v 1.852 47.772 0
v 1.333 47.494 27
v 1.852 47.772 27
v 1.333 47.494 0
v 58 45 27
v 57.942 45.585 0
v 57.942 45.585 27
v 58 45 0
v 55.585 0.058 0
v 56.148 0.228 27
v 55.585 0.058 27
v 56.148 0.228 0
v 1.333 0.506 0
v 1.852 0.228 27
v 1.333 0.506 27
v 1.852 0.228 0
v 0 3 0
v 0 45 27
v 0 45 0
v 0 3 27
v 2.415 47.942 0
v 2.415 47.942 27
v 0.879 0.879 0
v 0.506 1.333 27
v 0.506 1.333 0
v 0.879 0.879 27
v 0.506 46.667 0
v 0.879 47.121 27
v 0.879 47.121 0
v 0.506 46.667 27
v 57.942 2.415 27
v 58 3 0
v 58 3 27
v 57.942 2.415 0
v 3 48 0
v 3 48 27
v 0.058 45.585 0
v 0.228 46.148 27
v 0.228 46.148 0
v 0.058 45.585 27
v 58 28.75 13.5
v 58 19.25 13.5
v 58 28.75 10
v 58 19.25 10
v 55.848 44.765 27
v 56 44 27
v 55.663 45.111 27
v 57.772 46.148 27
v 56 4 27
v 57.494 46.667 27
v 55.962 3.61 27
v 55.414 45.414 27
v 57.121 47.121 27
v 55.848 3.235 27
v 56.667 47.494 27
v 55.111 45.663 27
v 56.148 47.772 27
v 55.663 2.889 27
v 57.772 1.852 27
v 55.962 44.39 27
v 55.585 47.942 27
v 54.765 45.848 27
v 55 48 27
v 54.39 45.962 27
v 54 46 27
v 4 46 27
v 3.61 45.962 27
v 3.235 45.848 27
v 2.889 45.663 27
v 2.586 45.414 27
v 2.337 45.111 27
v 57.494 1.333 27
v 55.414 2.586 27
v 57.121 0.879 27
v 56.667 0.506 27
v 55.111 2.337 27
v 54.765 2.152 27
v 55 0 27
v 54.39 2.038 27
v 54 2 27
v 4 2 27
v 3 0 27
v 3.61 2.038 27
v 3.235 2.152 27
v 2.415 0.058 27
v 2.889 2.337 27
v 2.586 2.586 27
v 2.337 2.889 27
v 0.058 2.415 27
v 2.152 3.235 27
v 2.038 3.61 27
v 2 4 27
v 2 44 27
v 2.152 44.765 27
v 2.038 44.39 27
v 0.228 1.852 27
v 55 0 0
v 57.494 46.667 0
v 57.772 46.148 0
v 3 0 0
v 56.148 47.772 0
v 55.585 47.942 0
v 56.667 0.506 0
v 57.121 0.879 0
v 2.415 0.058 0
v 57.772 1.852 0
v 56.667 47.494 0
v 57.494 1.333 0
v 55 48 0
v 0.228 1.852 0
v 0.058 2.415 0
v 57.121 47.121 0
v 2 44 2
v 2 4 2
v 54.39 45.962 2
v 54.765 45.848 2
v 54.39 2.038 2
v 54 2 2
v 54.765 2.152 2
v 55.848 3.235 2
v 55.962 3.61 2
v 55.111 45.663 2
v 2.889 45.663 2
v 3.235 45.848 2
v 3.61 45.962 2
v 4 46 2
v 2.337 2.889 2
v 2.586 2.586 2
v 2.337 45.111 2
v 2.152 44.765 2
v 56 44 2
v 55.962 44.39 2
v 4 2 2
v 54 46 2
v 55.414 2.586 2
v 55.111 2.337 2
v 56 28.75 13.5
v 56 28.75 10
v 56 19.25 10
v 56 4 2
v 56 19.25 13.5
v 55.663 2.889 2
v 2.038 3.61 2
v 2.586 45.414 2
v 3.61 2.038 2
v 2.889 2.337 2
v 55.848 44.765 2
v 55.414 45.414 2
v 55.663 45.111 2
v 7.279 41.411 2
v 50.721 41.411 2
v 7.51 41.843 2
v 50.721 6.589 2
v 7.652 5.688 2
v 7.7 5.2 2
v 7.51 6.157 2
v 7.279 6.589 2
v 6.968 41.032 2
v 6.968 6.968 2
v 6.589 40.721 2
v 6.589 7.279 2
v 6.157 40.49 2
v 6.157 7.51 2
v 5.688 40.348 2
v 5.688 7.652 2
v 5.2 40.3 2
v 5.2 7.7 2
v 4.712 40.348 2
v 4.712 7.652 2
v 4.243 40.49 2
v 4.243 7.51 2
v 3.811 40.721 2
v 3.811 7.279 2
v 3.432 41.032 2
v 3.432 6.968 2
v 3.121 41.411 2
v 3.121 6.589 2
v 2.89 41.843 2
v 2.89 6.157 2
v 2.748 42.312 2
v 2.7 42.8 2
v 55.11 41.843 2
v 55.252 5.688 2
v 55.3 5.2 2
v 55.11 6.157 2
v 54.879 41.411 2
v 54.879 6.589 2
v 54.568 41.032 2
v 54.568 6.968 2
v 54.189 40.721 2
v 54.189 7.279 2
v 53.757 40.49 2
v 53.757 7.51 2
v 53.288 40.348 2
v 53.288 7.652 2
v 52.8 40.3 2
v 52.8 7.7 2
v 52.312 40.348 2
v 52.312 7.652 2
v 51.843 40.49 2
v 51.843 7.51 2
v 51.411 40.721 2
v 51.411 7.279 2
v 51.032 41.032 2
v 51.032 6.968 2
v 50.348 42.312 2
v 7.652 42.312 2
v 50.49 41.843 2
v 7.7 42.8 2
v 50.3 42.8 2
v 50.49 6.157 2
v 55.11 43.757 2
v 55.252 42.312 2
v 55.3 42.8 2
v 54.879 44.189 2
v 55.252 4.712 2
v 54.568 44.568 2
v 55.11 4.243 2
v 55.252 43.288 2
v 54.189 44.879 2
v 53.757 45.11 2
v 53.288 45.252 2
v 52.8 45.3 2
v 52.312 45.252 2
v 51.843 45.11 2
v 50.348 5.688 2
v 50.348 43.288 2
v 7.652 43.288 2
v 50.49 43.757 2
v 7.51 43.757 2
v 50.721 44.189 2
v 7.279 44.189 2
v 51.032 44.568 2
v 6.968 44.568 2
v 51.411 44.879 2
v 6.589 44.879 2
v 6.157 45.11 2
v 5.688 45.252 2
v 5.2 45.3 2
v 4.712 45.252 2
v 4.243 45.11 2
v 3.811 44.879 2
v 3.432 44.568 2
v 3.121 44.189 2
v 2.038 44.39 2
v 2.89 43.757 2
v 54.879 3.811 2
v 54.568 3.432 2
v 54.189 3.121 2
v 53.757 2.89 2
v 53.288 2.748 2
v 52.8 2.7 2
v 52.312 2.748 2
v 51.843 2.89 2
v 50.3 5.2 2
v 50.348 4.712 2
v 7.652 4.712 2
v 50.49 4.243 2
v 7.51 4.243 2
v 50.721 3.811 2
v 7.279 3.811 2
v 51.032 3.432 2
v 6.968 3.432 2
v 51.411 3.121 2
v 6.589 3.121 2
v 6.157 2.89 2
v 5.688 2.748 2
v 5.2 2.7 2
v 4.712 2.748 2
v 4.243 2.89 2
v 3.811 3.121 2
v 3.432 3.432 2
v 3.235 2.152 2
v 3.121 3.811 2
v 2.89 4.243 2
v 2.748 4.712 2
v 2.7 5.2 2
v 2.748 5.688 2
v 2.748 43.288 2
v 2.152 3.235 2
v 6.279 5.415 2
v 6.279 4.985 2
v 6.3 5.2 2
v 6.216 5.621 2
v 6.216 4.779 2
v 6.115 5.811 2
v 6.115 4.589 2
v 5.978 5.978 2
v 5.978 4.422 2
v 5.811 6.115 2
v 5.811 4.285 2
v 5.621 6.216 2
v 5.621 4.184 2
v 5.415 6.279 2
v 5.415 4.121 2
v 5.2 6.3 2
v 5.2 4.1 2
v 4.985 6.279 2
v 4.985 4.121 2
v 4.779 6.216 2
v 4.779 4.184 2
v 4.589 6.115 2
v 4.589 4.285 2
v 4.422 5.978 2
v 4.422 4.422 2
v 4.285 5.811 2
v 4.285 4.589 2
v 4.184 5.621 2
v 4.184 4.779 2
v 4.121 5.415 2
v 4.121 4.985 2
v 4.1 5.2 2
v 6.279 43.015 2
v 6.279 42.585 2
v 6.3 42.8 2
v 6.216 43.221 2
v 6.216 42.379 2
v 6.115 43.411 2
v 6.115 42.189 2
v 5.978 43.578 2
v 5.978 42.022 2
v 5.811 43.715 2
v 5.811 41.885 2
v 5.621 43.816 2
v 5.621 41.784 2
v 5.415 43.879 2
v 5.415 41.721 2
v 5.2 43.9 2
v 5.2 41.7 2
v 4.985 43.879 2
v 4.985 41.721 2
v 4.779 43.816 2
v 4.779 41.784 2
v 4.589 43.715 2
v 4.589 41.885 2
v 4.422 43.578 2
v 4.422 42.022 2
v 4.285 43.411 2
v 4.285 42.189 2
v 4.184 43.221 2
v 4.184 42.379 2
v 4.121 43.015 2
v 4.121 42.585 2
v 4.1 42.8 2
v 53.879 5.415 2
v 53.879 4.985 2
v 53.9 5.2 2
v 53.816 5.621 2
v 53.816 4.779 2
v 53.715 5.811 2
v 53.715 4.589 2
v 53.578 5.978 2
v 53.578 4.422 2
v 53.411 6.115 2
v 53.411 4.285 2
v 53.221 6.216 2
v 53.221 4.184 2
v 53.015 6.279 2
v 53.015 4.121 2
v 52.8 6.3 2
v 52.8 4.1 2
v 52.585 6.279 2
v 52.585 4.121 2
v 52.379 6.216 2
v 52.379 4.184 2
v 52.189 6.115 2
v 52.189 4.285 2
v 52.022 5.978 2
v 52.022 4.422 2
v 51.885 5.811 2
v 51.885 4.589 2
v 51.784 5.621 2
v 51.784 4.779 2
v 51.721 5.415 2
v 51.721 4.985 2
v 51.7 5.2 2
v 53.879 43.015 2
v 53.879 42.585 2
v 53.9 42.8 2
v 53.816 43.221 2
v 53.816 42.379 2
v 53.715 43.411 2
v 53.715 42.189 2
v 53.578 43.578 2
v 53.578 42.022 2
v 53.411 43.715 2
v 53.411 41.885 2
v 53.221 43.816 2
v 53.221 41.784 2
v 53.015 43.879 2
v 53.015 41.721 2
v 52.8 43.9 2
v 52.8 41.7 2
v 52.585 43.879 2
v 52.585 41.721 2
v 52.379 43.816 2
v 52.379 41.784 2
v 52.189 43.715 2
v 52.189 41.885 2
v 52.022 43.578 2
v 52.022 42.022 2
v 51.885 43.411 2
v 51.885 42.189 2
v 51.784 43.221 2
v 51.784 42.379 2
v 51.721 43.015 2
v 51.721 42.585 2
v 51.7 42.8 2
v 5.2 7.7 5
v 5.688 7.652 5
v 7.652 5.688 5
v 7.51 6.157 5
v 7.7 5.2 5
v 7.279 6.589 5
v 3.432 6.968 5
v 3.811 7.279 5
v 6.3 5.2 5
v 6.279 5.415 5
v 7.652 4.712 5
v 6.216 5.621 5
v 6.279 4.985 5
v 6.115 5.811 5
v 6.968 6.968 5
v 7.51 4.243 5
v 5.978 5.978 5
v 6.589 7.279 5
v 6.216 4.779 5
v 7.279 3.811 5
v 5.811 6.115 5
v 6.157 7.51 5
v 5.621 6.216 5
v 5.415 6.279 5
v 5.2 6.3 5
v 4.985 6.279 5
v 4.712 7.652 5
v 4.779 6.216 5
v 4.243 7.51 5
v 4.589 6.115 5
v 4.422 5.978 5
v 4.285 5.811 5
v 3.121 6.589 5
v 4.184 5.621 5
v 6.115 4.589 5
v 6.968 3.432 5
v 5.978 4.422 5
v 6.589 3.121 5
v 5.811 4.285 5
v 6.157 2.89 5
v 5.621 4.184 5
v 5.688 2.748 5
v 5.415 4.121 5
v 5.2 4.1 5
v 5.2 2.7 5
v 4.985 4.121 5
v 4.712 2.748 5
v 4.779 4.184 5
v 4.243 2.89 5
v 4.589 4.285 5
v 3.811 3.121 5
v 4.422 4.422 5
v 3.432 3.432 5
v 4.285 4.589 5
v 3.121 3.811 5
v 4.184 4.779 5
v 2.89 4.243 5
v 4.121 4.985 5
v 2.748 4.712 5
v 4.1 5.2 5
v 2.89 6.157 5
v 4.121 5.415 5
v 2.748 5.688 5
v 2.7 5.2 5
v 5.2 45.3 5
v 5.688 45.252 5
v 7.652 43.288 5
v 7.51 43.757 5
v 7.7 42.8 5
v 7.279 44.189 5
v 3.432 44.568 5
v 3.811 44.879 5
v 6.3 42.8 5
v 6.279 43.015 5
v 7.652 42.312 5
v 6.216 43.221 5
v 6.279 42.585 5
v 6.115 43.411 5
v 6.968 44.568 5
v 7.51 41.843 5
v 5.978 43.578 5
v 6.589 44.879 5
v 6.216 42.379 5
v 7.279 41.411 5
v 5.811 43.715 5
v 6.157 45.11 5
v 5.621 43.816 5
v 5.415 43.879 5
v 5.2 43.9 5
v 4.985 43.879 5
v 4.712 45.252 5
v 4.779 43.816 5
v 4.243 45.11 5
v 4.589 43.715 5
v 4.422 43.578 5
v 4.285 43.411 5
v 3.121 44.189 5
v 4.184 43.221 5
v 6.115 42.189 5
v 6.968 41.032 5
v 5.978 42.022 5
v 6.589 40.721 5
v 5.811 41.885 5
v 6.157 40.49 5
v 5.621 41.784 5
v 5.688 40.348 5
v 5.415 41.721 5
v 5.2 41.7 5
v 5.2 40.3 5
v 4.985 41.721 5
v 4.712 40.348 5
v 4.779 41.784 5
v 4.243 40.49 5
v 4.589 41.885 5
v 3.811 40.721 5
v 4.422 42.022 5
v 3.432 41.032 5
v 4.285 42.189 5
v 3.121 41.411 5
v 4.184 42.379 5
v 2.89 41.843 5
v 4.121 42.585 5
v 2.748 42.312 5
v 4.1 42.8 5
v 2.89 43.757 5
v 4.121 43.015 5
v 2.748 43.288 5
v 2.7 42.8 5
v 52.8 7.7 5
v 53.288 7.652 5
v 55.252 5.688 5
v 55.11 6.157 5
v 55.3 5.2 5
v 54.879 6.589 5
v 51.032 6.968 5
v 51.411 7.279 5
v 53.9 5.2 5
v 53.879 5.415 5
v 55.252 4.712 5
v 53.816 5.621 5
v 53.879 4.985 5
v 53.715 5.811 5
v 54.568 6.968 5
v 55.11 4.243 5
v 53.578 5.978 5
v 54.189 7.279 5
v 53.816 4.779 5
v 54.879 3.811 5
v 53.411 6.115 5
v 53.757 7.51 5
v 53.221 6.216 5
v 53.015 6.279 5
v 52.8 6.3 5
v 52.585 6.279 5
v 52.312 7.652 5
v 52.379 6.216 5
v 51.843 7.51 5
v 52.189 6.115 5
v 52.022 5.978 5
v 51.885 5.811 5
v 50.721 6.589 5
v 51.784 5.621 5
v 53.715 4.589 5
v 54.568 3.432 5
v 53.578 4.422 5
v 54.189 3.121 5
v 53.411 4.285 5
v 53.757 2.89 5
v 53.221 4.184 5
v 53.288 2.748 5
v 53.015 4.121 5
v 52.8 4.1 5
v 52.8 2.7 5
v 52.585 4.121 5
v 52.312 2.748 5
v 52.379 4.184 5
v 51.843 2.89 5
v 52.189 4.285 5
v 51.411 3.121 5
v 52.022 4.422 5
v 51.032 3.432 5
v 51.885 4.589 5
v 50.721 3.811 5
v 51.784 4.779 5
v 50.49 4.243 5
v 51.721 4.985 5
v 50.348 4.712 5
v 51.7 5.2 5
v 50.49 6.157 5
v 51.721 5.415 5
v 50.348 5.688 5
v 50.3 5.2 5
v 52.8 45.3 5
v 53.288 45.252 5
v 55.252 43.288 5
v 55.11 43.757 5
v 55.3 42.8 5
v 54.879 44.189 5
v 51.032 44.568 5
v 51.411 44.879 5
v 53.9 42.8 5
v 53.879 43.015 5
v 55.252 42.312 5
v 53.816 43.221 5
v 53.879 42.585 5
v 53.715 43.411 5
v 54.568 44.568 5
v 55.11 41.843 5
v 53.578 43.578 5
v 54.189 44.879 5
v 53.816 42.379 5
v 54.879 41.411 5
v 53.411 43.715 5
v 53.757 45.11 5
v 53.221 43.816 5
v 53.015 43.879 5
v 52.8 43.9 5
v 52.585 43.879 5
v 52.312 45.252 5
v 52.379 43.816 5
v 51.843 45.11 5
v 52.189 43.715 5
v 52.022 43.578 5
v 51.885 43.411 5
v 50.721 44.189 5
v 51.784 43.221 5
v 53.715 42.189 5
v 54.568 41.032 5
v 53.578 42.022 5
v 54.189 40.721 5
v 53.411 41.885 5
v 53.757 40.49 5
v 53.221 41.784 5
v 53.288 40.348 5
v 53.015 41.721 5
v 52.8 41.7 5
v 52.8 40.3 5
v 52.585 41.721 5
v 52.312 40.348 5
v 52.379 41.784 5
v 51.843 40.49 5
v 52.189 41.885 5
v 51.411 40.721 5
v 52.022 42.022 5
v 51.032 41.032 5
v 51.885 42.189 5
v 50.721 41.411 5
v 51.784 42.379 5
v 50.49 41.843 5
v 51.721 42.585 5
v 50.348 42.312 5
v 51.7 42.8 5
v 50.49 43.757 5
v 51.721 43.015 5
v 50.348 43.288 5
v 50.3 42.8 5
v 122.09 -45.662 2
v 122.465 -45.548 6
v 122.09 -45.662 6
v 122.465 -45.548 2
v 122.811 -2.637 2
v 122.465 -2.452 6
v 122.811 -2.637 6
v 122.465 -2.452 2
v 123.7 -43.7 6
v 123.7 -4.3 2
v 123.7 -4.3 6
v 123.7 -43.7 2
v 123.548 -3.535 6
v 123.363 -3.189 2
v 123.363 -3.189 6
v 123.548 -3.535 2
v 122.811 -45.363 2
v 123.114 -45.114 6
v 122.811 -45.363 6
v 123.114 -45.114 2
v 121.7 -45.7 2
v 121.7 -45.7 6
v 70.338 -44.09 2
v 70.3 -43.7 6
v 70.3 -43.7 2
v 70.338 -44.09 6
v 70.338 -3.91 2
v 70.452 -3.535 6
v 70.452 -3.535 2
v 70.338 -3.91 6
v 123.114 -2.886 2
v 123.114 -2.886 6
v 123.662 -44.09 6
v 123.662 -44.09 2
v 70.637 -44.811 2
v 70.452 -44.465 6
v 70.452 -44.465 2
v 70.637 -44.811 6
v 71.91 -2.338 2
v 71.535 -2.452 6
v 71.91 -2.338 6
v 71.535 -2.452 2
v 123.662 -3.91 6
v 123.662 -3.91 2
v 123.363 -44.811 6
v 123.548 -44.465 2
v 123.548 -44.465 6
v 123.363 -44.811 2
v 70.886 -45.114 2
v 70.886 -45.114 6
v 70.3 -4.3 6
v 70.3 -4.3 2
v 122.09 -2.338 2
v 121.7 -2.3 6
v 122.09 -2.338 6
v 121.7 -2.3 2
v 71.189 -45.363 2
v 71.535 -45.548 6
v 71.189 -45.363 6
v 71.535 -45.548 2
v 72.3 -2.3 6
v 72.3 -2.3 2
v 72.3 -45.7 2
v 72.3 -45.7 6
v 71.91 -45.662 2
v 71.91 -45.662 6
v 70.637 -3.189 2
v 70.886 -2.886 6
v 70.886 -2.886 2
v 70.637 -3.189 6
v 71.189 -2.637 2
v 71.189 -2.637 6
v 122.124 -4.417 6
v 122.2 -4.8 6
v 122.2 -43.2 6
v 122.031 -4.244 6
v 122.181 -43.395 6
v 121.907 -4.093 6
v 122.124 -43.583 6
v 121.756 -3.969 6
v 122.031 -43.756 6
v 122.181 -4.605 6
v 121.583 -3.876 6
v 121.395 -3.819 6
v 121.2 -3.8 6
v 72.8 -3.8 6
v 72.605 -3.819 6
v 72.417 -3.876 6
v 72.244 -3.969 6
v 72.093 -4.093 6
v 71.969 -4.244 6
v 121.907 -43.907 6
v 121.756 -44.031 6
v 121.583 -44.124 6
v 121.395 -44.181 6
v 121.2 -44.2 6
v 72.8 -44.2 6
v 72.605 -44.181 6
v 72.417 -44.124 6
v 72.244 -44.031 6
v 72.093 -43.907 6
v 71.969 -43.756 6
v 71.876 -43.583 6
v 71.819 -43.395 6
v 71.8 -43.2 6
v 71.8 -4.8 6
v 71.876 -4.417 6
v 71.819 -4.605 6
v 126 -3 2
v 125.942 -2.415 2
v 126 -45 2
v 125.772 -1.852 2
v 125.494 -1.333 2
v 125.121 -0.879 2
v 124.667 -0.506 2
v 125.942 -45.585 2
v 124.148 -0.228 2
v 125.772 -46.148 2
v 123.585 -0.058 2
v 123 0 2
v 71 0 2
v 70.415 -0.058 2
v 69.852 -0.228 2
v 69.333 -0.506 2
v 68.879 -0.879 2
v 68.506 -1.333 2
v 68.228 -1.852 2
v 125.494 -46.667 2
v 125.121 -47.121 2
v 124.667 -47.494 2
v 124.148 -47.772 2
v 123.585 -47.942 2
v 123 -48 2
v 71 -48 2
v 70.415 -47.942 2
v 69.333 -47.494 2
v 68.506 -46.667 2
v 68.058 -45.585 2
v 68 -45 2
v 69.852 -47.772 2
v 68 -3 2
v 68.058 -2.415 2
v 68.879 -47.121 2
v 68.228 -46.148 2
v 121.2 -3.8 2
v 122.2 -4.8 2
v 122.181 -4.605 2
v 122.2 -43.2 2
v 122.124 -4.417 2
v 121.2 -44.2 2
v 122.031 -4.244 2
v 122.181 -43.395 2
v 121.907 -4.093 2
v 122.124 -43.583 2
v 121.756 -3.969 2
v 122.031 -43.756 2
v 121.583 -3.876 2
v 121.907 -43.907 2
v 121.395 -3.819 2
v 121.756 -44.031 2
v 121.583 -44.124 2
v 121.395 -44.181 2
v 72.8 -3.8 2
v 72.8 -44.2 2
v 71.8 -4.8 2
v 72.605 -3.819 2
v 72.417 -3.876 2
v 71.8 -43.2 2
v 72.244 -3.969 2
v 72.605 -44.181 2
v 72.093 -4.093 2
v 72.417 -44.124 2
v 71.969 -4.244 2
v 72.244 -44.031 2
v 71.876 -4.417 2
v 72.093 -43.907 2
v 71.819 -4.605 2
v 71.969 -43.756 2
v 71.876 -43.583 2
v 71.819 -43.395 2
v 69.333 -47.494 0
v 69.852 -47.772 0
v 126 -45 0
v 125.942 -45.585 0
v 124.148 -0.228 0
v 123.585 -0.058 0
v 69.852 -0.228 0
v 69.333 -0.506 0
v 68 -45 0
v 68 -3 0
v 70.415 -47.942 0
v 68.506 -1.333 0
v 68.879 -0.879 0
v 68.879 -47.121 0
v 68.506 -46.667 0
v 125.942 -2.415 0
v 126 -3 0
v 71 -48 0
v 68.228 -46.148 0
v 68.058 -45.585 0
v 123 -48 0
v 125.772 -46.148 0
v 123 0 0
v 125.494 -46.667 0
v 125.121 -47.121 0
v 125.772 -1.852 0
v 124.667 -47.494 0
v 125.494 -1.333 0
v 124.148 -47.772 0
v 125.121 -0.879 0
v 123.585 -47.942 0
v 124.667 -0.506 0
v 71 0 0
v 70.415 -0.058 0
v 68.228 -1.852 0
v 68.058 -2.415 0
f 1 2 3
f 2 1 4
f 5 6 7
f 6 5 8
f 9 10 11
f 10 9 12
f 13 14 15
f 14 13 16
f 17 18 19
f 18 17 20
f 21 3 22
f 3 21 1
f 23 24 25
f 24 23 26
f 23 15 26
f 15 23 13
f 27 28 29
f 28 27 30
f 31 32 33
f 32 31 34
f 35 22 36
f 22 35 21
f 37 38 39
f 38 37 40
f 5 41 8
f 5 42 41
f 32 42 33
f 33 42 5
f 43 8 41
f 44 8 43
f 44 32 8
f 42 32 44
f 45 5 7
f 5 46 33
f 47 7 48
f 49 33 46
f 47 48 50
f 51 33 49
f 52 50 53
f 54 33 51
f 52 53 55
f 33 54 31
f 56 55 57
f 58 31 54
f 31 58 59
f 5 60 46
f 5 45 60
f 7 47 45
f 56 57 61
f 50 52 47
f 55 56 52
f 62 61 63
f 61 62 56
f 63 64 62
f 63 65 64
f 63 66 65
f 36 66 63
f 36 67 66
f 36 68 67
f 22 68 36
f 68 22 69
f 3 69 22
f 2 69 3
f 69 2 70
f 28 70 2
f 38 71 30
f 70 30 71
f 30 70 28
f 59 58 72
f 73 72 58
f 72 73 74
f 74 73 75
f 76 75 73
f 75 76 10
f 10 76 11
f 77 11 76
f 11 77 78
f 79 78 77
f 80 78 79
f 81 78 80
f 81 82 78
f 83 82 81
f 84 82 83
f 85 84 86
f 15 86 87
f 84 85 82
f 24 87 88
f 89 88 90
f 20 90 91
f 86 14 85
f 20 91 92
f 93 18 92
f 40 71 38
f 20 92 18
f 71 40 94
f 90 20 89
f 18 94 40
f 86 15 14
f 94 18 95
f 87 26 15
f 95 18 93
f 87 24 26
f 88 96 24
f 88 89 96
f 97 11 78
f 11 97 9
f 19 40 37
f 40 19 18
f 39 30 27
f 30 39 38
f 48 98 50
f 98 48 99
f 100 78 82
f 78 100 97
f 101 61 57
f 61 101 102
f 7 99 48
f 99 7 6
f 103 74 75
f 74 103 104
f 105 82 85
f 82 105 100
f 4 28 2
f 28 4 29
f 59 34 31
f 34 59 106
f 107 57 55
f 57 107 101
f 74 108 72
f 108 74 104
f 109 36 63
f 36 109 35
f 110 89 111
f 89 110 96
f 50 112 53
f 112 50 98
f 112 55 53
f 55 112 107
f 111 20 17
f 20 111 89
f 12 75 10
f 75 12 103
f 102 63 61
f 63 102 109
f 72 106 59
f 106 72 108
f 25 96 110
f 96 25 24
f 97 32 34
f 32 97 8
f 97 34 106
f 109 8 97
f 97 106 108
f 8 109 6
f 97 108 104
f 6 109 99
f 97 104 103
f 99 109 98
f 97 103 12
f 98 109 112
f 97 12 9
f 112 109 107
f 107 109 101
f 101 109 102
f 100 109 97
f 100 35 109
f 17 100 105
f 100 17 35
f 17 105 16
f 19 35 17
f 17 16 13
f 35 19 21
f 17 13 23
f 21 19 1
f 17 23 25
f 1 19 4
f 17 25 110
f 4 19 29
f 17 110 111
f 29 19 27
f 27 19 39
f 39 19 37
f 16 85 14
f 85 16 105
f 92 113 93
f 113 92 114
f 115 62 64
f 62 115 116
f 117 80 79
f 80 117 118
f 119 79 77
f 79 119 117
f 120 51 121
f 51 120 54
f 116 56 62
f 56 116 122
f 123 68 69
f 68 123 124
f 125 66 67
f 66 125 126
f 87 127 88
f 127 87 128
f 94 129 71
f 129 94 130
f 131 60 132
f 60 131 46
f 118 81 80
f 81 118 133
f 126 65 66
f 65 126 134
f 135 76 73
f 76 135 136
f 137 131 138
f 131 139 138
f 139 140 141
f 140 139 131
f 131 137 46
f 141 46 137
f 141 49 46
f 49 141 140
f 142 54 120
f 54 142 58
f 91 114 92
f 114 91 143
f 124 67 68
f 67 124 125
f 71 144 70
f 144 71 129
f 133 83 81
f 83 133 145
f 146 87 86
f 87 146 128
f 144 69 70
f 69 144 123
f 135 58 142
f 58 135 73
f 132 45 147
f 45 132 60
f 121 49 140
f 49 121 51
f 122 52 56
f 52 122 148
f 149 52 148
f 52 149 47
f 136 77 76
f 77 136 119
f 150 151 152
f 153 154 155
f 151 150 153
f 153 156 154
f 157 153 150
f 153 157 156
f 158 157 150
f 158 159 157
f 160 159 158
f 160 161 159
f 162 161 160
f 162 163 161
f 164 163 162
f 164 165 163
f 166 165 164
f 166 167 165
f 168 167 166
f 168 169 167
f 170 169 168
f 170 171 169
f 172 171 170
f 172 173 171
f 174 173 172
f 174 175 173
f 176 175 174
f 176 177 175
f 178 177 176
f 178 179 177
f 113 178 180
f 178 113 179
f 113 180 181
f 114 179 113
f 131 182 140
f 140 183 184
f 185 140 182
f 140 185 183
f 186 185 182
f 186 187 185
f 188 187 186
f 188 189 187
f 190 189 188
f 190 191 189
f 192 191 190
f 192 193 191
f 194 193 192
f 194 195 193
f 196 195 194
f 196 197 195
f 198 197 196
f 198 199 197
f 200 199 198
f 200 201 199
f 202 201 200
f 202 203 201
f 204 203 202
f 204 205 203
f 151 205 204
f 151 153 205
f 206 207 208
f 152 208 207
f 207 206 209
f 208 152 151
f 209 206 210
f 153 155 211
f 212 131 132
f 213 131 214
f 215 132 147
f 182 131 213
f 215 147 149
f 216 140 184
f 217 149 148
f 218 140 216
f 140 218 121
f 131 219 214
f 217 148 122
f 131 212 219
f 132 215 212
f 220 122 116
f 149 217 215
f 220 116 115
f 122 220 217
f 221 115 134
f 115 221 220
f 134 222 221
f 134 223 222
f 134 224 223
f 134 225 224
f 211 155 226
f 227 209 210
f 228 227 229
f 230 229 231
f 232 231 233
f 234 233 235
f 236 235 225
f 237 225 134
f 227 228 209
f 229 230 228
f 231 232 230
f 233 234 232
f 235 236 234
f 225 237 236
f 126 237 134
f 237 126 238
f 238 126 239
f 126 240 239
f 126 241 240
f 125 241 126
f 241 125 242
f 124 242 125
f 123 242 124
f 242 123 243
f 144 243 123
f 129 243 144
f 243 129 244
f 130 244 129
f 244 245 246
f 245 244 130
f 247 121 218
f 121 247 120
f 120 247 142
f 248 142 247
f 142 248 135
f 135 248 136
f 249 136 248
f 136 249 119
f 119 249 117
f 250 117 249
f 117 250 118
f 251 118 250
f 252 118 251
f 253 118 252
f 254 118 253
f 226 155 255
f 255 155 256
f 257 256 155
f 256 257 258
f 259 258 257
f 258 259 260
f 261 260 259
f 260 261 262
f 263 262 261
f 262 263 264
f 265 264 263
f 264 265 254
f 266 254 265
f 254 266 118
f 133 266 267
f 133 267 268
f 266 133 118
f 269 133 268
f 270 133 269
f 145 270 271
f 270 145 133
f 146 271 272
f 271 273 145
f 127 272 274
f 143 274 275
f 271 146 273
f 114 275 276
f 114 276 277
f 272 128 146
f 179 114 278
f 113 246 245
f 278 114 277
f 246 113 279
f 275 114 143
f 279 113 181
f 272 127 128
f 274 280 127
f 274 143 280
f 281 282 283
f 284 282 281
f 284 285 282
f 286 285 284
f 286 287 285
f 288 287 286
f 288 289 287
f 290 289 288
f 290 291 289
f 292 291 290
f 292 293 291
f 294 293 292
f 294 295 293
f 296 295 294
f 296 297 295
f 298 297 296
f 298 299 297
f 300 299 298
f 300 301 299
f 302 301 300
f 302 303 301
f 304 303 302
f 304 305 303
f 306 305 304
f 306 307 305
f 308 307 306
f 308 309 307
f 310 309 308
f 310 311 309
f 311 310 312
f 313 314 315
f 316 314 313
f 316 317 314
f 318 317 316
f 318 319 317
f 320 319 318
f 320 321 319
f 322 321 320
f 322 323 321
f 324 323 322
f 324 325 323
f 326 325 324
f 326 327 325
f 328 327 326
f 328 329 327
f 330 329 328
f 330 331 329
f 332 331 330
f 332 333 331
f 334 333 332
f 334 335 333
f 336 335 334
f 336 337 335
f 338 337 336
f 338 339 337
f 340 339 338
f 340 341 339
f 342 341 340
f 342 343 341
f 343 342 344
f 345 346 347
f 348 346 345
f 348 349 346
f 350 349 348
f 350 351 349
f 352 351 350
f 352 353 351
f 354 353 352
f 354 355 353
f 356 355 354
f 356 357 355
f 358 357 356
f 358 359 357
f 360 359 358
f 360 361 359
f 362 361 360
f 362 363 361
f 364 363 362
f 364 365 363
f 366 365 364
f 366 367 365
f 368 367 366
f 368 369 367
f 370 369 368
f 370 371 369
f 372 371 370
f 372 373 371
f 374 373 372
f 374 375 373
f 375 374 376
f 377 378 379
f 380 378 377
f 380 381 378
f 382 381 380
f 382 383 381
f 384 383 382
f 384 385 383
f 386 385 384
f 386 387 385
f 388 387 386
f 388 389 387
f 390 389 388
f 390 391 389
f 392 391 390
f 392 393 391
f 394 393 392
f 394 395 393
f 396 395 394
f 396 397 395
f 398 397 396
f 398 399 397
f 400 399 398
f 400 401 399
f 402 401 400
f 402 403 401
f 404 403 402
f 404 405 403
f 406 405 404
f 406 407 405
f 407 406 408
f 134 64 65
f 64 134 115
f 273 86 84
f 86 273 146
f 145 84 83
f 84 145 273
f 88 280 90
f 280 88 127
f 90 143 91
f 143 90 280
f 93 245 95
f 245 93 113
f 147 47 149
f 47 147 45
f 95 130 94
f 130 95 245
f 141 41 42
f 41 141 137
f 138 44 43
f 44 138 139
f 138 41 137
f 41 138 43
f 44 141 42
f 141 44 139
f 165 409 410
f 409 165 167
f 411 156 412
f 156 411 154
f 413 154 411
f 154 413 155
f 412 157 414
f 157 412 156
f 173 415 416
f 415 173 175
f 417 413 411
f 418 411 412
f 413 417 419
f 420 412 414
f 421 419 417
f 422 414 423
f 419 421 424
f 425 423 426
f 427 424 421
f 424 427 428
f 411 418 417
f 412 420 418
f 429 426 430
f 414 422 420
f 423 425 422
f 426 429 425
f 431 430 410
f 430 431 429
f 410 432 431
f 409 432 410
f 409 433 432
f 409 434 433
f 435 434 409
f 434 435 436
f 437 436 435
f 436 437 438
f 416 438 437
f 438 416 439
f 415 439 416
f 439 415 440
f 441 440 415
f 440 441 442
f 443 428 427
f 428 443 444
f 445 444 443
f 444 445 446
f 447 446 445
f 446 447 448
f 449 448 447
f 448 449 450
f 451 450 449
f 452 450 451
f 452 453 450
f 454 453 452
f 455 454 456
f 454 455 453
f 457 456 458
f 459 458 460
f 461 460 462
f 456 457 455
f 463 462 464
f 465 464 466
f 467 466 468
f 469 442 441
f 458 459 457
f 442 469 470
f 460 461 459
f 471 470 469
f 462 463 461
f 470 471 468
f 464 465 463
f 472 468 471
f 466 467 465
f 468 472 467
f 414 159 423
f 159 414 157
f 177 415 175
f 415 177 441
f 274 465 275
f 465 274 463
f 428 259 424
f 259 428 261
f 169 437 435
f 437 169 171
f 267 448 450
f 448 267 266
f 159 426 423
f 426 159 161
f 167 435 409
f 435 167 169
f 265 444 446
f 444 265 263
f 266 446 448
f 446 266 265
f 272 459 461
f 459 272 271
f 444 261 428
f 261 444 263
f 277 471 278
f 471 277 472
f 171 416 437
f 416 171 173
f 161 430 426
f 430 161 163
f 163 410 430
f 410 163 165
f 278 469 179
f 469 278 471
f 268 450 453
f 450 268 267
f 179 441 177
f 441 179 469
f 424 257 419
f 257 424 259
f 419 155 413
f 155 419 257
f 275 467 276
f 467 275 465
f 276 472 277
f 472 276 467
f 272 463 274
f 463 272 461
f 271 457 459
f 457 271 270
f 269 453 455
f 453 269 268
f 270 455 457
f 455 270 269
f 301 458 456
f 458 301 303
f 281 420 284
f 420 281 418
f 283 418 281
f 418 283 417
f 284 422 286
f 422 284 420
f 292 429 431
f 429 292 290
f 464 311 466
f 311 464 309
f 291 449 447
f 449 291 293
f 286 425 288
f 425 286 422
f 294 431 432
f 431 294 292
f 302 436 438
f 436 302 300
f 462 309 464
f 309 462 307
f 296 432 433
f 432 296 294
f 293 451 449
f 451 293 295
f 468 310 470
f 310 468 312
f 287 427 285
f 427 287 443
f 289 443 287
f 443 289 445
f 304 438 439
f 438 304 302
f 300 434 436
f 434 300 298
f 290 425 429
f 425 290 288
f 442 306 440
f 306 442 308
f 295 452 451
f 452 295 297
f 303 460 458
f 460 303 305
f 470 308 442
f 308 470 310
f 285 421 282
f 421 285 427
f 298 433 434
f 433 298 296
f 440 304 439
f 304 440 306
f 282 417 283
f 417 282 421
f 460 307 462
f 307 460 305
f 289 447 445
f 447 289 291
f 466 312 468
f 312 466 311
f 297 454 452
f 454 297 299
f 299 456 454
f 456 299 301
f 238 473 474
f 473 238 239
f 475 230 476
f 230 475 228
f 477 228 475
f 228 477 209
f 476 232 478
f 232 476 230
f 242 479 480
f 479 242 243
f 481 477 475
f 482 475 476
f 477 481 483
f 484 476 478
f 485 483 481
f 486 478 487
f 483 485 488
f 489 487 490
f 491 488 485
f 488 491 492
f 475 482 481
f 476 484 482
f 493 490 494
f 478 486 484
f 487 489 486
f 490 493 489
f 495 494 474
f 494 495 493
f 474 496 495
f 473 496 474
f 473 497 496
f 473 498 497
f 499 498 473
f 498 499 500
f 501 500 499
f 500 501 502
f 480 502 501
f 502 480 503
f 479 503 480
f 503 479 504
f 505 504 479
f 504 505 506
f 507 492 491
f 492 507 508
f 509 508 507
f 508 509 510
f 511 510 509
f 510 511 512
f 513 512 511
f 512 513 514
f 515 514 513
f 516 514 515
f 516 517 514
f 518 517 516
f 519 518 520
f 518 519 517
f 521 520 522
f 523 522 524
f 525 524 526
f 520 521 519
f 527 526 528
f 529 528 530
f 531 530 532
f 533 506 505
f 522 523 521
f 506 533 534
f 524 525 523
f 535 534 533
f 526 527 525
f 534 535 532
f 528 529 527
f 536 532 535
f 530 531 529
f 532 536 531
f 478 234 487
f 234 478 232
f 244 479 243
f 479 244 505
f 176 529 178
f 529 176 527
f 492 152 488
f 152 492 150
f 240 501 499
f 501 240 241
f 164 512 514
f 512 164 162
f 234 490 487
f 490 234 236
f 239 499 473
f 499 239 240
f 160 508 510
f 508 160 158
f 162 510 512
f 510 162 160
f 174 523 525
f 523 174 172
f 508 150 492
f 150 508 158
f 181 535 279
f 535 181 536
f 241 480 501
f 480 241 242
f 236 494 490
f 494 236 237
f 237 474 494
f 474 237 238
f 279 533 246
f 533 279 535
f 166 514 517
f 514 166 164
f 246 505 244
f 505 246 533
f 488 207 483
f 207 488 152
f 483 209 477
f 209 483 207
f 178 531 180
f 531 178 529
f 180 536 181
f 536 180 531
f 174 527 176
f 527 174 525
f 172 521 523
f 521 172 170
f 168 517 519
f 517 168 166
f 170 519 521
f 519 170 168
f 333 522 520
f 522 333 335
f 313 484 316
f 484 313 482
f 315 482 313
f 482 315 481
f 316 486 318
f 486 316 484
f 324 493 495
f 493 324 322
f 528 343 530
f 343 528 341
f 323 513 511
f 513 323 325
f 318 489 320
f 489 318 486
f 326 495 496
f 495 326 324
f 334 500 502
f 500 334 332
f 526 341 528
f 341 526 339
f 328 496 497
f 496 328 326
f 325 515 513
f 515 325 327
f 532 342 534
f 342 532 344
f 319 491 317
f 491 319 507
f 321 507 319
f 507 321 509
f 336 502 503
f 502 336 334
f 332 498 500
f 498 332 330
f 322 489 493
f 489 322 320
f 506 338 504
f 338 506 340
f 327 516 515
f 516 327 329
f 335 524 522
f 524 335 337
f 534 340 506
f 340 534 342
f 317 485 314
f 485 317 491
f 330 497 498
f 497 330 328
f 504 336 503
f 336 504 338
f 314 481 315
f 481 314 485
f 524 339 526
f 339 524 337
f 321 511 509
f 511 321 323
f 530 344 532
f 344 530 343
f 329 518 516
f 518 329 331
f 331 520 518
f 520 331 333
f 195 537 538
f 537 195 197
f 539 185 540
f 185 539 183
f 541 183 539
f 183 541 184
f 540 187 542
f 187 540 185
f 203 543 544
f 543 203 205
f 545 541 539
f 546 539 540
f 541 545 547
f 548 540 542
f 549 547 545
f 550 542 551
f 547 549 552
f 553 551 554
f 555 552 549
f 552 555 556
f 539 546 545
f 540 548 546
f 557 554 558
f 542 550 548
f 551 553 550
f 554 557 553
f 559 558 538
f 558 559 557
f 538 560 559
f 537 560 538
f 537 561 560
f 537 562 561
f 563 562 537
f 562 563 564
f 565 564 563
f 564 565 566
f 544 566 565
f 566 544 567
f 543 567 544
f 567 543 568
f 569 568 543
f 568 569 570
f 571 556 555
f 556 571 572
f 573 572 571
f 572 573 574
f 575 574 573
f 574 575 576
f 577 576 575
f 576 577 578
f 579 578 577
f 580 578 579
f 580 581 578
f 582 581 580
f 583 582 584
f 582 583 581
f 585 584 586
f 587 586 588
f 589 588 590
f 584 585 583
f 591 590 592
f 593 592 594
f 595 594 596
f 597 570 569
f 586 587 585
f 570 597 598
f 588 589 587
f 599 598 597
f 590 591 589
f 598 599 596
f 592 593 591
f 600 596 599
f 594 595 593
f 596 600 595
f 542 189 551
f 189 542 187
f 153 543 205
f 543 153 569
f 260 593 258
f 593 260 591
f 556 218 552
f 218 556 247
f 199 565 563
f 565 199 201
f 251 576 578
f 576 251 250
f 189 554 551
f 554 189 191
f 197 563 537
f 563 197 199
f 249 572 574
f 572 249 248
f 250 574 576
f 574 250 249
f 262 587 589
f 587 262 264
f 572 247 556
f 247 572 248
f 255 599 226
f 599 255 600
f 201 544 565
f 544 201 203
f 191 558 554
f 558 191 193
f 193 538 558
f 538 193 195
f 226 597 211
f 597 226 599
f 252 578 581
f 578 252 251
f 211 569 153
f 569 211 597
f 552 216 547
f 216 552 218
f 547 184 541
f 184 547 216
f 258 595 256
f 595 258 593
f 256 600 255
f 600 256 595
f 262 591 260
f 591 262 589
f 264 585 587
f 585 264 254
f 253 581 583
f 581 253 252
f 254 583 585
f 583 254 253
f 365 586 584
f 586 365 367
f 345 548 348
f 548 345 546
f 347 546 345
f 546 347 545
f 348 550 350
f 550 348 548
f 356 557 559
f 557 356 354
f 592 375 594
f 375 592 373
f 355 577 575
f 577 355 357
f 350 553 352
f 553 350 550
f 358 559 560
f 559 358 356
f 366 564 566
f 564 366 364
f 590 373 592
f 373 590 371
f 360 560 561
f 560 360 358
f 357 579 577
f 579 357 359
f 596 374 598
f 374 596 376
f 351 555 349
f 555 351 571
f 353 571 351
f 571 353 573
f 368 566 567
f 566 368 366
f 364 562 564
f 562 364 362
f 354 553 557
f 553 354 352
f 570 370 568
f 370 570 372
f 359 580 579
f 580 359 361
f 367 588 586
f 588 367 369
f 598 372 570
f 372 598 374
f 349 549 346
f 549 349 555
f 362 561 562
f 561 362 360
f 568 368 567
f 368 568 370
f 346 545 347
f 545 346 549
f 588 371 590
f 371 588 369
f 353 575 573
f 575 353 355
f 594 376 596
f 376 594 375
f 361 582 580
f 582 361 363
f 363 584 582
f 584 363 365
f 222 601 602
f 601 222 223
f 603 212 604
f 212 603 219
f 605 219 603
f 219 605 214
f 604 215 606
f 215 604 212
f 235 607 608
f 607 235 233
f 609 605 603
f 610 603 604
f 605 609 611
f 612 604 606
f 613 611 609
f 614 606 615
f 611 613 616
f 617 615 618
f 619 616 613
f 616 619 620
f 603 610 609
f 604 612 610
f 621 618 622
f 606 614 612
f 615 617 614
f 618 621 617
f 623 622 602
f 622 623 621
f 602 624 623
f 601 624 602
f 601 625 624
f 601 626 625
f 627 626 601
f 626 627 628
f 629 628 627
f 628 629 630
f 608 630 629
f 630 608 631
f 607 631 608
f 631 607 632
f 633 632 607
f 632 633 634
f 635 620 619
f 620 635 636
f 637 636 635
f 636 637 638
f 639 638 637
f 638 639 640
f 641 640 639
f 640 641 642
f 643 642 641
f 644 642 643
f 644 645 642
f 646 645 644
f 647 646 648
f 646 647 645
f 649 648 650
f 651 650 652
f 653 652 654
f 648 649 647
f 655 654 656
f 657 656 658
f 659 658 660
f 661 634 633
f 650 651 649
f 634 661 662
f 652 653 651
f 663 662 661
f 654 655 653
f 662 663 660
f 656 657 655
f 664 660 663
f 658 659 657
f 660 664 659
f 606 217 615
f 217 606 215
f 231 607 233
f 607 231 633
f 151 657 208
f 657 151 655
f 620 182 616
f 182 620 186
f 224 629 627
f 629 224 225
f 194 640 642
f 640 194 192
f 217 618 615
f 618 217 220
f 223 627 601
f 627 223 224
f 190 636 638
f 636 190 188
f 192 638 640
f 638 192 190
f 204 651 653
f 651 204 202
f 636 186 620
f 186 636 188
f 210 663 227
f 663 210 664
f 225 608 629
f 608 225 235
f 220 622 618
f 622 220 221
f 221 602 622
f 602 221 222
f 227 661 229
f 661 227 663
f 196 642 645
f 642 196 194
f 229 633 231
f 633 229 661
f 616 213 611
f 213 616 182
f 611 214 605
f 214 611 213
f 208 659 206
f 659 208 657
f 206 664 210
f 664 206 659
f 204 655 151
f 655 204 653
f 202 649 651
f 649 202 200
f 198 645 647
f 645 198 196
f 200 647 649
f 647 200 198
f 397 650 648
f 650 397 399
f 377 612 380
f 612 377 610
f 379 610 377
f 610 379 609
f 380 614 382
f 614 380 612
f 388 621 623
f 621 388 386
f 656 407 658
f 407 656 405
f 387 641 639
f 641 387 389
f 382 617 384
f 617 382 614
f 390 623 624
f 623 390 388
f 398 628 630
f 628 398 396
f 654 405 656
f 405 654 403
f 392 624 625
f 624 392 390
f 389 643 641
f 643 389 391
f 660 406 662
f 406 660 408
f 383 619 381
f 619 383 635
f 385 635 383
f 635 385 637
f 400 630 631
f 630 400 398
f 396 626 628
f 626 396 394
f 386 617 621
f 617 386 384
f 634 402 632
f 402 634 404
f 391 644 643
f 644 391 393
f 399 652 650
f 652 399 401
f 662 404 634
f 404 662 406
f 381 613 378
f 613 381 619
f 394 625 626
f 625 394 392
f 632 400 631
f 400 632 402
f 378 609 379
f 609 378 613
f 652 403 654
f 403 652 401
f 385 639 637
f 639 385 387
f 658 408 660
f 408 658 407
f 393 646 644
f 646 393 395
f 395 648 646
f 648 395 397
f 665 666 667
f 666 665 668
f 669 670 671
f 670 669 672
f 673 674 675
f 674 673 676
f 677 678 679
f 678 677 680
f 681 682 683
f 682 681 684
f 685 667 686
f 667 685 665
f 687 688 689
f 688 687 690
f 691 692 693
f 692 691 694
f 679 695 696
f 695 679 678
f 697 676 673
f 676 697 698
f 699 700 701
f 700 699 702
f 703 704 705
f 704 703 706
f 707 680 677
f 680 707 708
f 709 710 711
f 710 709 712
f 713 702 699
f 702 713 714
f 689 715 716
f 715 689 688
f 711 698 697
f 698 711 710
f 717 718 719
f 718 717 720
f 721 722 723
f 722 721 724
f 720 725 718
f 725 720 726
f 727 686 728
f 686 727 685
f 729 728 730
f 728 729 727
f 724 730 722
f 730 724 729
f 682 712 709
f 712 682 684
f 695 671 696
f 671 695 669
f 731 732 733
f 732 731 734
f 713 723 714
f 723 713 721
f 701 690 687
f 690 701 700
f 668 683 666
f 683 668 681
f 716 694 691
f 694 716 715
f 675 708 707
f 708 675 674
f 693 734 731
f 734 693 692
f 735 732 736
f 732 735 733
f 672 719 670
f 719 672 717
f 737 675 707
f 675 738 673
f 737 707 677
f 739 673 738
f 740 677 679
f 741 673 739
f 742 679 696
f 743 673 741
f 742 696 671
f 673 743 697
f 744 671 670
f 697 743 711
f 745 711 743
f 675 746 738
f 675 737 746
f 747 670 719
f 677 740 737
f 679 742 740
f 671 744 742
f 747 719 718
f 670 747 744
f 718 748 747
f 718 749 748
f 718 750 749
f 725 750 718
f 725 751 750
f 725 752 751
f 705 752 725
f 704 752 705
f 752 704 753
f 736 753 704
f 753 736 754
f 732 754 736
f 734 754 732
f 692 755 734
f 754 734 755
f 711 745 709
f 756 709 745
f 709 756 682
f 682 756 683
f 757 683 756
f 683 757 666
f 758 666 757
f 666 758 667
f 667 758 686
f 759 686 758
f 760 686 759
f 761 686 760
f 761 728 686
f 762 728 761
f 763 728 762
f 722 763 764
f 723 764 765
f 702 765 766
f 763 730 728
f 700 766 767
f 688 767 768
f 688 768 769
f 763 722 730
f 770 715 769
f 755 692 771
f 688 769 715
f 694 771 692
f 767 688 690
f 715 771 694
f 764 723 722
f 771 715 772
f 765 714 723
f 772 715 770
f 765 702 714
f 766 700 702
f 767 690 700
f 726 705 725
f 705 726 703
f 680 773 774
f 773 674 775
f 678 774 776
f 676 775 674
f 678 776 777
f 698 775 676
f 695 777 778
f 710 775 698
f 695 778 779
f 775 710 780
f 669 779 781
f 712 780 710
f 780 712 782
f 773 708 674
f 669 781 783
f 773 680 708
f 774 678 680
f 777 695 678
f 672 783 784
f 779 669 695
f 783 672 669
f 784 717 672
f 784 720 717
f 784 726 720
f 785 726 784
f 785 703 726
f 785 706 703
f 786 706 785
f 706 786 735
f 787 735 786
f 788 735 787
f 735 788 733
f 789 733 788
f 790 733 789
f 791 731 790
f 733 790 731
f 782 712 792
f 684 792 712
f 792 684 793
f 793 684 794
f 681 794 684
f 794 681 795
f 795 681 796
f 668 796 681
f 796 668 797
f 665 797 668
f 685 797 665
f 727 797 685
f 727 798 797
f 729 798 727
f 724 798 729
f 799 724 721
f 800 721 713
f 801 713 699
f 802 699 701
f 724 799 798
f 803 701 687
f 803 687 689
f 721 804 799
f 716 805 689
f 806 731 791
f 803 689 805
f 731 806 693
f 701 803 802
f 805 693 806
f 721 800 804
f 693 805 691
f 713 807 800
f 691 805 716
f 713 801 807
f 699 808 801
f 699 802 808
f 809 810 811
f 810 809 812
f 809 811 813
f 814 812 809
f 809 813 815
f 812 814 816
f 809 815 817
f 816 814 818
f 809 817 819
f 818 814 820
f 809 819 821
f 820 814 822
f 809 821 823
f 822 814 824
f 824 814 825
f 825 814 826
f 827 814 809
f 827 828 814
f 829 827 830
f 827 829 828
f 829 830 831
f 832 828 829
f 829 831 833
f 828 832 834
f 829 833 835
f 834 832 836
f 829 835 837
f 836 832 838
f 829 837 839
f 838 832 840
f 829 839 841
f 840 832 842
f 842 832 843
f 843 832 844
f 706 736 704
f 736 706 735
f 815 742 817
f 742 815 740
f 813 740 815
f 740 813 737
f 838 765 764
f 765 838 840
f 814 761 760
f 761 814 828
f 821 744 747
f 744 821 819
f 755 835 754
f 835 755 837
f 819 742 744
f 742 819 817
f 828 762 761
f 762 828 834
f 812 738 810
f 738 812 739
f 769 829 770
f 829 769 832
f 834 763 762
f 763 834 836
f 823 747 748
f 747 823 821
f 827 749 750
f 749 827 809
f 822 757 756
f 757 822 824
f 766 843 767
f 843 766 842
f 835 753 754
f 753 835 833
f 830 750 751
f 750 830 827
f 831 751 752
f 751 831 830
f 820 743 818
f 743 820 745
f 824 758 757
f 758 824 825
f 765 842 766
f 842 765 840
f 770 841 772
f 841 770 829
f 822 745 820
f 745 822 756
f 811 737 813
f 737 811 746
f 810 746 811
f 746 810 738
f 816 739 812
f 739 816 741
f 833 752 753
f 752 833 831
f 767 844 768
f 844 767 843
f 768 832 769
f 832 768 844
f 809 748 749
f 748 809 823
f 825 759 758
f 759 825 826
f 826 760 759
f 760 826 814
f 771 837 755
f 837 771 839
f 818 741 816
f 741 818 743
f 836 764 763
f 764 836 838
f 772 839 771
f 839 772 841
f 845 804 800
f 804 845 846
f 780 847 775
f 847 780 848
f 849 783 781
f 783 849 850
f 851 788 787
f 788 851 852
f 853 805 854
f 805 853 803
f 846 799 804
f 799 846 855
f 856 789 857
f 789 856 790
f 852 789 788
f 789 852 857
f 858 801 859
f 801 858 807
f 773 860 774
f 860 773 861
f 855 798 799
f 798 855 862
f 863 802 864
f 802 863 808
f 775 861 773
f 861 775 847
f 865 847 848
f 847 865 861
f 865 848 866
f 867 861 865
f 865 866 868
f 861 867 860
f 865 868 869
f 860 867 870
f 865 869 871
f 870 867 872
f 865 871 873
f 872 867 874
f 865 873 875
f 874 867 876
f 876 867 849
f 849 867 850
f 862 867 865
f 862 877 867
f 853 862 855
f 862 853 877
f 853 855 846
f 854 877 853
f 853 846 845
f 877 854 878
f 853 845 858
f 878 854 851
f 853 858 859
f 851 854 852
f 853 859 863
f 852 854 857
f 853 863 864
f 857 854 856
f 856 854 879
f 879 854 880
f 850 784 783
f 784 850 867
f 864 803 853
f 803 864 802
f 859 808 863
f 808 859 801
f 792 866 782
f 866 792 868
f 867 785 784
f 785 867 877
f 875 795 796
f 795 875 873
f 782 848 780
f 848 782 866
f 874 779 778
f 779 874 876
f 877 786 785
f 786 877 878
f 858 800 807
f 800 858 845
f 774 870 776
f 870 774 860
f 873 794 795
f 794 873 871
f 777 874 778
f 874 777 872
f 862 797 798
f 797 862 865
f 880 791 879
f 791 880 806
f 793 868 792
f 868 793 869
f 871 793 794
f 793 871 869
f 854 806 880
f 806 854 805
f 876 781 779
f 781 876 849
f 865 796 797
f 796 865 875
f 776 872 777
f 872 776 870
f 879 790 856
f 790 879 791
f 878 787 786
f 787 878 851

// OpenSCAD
// Electronics Box for ElectroCookie 1/4 Breadboard
// Dimensions: 2" x 1.6" (50.8mm x 40.6mm)
// Features: Removable lid, USB-C port on short end

/* [Box Dimensions] */
// Inner dimensions (slightly larger than breadboard for clearance)
inner_length = 54;      // mm (breadboard is 50.8mm)
inner_width = 44;       // mm (breadboard is 40.6mm)
inner_height = 25;      // mm - adjust based on component height

/* [Wall Thickness] */
wall = 2;               // mm
lid_thickness = 2;      // mm

/* [Tolerances] */
lid_tolerance = 0.3;    // mm gap for lid fit

/* [USB-C Port] */
usbc_width = 9.5;       // mm (USB-C connector width)
usbc_height = 3.5;      // mm (USB-C connector height)
usbc_z_offset = 8;      // mm from bottom of inner floor

/* [Mounting] */
standoff_height = 3;    // mm
standoff_diameter = 5;  // mm
screw_hole_diameter = 2.2; // mm (M2 screws)
// Breadboard hole spacing from edges (approximate)
mount_inset_x = 3.2;    // mm from edge
mount_inset_y = 3.2;    // mm from edge

/* [Lid Lip] */
lip_height = 4;         // mm
lip_width = 1.5;        // mm

// Calculated dimensions
outer_length = inner_length + 2 * wall;
outer_width = inner_width + 2 * wall;
outer_height = inner_height + wall; // bottom wall only, lid separate

$fn = 32;

module rounded_box(length, width, height, radius) {
    hull() {
        for (x = [radius, length - radius]) {
            for (y = [radius, width - radius]) {
                translate([x, y, 0])
                    cylinder(r = radius, h = height);
            }
        }
    }
}

module box_base() {
    corner_radius = 3;

    difference() {
        // Outer shell
        rounded_box(outer_length, outer_width, outer_height, corner_radius);

        // Inner cavity
        translate([wall, wall, wall])
            rounded_box(inner_length, inner_width, inner_height + 1, corner_radius - wall/2);

        // USB-C cutout on short end (X = outer_length side)
        translate([outer_length - wall - 1, outer_width/2 - usbc_width/2, wall + usbc_z_offset])
            cube([wall + 2, usbc_width, usbc_height]);
    }

    // Mounting standoffs for breadboard
    translate([wall, wall, wall]) {
        // Four corners based on breadboard mounting holes
        for (x = [mount_inset_x, inner_length - mount_inset_x]) {
            for (y = [mount_inset_y, inner_width - mount_inset_y]) {
                translate([x, y, 0]) {
                    difference() {
                        cylinder(d = standoff_diameter, h = standoff_height);
                        cylinder(d = screw_hole_diameter, h = standoff_height + 1);
                    }
                }
            }
        }
    }
}

module lid() {
    corner_radius = 3;

    // Main lid plate
    difference() {
        rounded_box(outer_length, outer_width, lid_thickness, corner_radius);

        // Optional: ventilation holes (commented out)
        // for (x = [10 : 8 : outer_length - 10]) {
        //     for (y = [10 : 8 : outer_width - 10]) {
        //         translate([x, y, -1])
        //             cylinder(d = 3, h = lid_thickness + 2);
        //     }
        // }
    }

    // Inner lip that fits inside the box
    translate([wall + lid_tolerance, wall + lid_tolerance, -lip_height])
        difference() {
            rounded_box(inner_length - 2*lid_tolerance, inner_width - 2*lid_tolerance, lip_height, corner_radius - wall/2);
            translate([lip_width, lip_width, -1])
                rounded_box(inner_length - 2*lid_tolerance - 2*lip_width, inner_width - 2*lid_tolerance - 2*lip_width, lip_height + 2, corner_radius - wall);
        }
}

// Render
// Box base
box_base();

// Lid - positioned to the side for printing
translate([outer_length + 10, 0, lid_thickness])
    rotate([180, 0, 0])
        lid();

// Uncomment below to see lid in place (for visualization)
// translate([0, 0, outer_height])
//     lid();
